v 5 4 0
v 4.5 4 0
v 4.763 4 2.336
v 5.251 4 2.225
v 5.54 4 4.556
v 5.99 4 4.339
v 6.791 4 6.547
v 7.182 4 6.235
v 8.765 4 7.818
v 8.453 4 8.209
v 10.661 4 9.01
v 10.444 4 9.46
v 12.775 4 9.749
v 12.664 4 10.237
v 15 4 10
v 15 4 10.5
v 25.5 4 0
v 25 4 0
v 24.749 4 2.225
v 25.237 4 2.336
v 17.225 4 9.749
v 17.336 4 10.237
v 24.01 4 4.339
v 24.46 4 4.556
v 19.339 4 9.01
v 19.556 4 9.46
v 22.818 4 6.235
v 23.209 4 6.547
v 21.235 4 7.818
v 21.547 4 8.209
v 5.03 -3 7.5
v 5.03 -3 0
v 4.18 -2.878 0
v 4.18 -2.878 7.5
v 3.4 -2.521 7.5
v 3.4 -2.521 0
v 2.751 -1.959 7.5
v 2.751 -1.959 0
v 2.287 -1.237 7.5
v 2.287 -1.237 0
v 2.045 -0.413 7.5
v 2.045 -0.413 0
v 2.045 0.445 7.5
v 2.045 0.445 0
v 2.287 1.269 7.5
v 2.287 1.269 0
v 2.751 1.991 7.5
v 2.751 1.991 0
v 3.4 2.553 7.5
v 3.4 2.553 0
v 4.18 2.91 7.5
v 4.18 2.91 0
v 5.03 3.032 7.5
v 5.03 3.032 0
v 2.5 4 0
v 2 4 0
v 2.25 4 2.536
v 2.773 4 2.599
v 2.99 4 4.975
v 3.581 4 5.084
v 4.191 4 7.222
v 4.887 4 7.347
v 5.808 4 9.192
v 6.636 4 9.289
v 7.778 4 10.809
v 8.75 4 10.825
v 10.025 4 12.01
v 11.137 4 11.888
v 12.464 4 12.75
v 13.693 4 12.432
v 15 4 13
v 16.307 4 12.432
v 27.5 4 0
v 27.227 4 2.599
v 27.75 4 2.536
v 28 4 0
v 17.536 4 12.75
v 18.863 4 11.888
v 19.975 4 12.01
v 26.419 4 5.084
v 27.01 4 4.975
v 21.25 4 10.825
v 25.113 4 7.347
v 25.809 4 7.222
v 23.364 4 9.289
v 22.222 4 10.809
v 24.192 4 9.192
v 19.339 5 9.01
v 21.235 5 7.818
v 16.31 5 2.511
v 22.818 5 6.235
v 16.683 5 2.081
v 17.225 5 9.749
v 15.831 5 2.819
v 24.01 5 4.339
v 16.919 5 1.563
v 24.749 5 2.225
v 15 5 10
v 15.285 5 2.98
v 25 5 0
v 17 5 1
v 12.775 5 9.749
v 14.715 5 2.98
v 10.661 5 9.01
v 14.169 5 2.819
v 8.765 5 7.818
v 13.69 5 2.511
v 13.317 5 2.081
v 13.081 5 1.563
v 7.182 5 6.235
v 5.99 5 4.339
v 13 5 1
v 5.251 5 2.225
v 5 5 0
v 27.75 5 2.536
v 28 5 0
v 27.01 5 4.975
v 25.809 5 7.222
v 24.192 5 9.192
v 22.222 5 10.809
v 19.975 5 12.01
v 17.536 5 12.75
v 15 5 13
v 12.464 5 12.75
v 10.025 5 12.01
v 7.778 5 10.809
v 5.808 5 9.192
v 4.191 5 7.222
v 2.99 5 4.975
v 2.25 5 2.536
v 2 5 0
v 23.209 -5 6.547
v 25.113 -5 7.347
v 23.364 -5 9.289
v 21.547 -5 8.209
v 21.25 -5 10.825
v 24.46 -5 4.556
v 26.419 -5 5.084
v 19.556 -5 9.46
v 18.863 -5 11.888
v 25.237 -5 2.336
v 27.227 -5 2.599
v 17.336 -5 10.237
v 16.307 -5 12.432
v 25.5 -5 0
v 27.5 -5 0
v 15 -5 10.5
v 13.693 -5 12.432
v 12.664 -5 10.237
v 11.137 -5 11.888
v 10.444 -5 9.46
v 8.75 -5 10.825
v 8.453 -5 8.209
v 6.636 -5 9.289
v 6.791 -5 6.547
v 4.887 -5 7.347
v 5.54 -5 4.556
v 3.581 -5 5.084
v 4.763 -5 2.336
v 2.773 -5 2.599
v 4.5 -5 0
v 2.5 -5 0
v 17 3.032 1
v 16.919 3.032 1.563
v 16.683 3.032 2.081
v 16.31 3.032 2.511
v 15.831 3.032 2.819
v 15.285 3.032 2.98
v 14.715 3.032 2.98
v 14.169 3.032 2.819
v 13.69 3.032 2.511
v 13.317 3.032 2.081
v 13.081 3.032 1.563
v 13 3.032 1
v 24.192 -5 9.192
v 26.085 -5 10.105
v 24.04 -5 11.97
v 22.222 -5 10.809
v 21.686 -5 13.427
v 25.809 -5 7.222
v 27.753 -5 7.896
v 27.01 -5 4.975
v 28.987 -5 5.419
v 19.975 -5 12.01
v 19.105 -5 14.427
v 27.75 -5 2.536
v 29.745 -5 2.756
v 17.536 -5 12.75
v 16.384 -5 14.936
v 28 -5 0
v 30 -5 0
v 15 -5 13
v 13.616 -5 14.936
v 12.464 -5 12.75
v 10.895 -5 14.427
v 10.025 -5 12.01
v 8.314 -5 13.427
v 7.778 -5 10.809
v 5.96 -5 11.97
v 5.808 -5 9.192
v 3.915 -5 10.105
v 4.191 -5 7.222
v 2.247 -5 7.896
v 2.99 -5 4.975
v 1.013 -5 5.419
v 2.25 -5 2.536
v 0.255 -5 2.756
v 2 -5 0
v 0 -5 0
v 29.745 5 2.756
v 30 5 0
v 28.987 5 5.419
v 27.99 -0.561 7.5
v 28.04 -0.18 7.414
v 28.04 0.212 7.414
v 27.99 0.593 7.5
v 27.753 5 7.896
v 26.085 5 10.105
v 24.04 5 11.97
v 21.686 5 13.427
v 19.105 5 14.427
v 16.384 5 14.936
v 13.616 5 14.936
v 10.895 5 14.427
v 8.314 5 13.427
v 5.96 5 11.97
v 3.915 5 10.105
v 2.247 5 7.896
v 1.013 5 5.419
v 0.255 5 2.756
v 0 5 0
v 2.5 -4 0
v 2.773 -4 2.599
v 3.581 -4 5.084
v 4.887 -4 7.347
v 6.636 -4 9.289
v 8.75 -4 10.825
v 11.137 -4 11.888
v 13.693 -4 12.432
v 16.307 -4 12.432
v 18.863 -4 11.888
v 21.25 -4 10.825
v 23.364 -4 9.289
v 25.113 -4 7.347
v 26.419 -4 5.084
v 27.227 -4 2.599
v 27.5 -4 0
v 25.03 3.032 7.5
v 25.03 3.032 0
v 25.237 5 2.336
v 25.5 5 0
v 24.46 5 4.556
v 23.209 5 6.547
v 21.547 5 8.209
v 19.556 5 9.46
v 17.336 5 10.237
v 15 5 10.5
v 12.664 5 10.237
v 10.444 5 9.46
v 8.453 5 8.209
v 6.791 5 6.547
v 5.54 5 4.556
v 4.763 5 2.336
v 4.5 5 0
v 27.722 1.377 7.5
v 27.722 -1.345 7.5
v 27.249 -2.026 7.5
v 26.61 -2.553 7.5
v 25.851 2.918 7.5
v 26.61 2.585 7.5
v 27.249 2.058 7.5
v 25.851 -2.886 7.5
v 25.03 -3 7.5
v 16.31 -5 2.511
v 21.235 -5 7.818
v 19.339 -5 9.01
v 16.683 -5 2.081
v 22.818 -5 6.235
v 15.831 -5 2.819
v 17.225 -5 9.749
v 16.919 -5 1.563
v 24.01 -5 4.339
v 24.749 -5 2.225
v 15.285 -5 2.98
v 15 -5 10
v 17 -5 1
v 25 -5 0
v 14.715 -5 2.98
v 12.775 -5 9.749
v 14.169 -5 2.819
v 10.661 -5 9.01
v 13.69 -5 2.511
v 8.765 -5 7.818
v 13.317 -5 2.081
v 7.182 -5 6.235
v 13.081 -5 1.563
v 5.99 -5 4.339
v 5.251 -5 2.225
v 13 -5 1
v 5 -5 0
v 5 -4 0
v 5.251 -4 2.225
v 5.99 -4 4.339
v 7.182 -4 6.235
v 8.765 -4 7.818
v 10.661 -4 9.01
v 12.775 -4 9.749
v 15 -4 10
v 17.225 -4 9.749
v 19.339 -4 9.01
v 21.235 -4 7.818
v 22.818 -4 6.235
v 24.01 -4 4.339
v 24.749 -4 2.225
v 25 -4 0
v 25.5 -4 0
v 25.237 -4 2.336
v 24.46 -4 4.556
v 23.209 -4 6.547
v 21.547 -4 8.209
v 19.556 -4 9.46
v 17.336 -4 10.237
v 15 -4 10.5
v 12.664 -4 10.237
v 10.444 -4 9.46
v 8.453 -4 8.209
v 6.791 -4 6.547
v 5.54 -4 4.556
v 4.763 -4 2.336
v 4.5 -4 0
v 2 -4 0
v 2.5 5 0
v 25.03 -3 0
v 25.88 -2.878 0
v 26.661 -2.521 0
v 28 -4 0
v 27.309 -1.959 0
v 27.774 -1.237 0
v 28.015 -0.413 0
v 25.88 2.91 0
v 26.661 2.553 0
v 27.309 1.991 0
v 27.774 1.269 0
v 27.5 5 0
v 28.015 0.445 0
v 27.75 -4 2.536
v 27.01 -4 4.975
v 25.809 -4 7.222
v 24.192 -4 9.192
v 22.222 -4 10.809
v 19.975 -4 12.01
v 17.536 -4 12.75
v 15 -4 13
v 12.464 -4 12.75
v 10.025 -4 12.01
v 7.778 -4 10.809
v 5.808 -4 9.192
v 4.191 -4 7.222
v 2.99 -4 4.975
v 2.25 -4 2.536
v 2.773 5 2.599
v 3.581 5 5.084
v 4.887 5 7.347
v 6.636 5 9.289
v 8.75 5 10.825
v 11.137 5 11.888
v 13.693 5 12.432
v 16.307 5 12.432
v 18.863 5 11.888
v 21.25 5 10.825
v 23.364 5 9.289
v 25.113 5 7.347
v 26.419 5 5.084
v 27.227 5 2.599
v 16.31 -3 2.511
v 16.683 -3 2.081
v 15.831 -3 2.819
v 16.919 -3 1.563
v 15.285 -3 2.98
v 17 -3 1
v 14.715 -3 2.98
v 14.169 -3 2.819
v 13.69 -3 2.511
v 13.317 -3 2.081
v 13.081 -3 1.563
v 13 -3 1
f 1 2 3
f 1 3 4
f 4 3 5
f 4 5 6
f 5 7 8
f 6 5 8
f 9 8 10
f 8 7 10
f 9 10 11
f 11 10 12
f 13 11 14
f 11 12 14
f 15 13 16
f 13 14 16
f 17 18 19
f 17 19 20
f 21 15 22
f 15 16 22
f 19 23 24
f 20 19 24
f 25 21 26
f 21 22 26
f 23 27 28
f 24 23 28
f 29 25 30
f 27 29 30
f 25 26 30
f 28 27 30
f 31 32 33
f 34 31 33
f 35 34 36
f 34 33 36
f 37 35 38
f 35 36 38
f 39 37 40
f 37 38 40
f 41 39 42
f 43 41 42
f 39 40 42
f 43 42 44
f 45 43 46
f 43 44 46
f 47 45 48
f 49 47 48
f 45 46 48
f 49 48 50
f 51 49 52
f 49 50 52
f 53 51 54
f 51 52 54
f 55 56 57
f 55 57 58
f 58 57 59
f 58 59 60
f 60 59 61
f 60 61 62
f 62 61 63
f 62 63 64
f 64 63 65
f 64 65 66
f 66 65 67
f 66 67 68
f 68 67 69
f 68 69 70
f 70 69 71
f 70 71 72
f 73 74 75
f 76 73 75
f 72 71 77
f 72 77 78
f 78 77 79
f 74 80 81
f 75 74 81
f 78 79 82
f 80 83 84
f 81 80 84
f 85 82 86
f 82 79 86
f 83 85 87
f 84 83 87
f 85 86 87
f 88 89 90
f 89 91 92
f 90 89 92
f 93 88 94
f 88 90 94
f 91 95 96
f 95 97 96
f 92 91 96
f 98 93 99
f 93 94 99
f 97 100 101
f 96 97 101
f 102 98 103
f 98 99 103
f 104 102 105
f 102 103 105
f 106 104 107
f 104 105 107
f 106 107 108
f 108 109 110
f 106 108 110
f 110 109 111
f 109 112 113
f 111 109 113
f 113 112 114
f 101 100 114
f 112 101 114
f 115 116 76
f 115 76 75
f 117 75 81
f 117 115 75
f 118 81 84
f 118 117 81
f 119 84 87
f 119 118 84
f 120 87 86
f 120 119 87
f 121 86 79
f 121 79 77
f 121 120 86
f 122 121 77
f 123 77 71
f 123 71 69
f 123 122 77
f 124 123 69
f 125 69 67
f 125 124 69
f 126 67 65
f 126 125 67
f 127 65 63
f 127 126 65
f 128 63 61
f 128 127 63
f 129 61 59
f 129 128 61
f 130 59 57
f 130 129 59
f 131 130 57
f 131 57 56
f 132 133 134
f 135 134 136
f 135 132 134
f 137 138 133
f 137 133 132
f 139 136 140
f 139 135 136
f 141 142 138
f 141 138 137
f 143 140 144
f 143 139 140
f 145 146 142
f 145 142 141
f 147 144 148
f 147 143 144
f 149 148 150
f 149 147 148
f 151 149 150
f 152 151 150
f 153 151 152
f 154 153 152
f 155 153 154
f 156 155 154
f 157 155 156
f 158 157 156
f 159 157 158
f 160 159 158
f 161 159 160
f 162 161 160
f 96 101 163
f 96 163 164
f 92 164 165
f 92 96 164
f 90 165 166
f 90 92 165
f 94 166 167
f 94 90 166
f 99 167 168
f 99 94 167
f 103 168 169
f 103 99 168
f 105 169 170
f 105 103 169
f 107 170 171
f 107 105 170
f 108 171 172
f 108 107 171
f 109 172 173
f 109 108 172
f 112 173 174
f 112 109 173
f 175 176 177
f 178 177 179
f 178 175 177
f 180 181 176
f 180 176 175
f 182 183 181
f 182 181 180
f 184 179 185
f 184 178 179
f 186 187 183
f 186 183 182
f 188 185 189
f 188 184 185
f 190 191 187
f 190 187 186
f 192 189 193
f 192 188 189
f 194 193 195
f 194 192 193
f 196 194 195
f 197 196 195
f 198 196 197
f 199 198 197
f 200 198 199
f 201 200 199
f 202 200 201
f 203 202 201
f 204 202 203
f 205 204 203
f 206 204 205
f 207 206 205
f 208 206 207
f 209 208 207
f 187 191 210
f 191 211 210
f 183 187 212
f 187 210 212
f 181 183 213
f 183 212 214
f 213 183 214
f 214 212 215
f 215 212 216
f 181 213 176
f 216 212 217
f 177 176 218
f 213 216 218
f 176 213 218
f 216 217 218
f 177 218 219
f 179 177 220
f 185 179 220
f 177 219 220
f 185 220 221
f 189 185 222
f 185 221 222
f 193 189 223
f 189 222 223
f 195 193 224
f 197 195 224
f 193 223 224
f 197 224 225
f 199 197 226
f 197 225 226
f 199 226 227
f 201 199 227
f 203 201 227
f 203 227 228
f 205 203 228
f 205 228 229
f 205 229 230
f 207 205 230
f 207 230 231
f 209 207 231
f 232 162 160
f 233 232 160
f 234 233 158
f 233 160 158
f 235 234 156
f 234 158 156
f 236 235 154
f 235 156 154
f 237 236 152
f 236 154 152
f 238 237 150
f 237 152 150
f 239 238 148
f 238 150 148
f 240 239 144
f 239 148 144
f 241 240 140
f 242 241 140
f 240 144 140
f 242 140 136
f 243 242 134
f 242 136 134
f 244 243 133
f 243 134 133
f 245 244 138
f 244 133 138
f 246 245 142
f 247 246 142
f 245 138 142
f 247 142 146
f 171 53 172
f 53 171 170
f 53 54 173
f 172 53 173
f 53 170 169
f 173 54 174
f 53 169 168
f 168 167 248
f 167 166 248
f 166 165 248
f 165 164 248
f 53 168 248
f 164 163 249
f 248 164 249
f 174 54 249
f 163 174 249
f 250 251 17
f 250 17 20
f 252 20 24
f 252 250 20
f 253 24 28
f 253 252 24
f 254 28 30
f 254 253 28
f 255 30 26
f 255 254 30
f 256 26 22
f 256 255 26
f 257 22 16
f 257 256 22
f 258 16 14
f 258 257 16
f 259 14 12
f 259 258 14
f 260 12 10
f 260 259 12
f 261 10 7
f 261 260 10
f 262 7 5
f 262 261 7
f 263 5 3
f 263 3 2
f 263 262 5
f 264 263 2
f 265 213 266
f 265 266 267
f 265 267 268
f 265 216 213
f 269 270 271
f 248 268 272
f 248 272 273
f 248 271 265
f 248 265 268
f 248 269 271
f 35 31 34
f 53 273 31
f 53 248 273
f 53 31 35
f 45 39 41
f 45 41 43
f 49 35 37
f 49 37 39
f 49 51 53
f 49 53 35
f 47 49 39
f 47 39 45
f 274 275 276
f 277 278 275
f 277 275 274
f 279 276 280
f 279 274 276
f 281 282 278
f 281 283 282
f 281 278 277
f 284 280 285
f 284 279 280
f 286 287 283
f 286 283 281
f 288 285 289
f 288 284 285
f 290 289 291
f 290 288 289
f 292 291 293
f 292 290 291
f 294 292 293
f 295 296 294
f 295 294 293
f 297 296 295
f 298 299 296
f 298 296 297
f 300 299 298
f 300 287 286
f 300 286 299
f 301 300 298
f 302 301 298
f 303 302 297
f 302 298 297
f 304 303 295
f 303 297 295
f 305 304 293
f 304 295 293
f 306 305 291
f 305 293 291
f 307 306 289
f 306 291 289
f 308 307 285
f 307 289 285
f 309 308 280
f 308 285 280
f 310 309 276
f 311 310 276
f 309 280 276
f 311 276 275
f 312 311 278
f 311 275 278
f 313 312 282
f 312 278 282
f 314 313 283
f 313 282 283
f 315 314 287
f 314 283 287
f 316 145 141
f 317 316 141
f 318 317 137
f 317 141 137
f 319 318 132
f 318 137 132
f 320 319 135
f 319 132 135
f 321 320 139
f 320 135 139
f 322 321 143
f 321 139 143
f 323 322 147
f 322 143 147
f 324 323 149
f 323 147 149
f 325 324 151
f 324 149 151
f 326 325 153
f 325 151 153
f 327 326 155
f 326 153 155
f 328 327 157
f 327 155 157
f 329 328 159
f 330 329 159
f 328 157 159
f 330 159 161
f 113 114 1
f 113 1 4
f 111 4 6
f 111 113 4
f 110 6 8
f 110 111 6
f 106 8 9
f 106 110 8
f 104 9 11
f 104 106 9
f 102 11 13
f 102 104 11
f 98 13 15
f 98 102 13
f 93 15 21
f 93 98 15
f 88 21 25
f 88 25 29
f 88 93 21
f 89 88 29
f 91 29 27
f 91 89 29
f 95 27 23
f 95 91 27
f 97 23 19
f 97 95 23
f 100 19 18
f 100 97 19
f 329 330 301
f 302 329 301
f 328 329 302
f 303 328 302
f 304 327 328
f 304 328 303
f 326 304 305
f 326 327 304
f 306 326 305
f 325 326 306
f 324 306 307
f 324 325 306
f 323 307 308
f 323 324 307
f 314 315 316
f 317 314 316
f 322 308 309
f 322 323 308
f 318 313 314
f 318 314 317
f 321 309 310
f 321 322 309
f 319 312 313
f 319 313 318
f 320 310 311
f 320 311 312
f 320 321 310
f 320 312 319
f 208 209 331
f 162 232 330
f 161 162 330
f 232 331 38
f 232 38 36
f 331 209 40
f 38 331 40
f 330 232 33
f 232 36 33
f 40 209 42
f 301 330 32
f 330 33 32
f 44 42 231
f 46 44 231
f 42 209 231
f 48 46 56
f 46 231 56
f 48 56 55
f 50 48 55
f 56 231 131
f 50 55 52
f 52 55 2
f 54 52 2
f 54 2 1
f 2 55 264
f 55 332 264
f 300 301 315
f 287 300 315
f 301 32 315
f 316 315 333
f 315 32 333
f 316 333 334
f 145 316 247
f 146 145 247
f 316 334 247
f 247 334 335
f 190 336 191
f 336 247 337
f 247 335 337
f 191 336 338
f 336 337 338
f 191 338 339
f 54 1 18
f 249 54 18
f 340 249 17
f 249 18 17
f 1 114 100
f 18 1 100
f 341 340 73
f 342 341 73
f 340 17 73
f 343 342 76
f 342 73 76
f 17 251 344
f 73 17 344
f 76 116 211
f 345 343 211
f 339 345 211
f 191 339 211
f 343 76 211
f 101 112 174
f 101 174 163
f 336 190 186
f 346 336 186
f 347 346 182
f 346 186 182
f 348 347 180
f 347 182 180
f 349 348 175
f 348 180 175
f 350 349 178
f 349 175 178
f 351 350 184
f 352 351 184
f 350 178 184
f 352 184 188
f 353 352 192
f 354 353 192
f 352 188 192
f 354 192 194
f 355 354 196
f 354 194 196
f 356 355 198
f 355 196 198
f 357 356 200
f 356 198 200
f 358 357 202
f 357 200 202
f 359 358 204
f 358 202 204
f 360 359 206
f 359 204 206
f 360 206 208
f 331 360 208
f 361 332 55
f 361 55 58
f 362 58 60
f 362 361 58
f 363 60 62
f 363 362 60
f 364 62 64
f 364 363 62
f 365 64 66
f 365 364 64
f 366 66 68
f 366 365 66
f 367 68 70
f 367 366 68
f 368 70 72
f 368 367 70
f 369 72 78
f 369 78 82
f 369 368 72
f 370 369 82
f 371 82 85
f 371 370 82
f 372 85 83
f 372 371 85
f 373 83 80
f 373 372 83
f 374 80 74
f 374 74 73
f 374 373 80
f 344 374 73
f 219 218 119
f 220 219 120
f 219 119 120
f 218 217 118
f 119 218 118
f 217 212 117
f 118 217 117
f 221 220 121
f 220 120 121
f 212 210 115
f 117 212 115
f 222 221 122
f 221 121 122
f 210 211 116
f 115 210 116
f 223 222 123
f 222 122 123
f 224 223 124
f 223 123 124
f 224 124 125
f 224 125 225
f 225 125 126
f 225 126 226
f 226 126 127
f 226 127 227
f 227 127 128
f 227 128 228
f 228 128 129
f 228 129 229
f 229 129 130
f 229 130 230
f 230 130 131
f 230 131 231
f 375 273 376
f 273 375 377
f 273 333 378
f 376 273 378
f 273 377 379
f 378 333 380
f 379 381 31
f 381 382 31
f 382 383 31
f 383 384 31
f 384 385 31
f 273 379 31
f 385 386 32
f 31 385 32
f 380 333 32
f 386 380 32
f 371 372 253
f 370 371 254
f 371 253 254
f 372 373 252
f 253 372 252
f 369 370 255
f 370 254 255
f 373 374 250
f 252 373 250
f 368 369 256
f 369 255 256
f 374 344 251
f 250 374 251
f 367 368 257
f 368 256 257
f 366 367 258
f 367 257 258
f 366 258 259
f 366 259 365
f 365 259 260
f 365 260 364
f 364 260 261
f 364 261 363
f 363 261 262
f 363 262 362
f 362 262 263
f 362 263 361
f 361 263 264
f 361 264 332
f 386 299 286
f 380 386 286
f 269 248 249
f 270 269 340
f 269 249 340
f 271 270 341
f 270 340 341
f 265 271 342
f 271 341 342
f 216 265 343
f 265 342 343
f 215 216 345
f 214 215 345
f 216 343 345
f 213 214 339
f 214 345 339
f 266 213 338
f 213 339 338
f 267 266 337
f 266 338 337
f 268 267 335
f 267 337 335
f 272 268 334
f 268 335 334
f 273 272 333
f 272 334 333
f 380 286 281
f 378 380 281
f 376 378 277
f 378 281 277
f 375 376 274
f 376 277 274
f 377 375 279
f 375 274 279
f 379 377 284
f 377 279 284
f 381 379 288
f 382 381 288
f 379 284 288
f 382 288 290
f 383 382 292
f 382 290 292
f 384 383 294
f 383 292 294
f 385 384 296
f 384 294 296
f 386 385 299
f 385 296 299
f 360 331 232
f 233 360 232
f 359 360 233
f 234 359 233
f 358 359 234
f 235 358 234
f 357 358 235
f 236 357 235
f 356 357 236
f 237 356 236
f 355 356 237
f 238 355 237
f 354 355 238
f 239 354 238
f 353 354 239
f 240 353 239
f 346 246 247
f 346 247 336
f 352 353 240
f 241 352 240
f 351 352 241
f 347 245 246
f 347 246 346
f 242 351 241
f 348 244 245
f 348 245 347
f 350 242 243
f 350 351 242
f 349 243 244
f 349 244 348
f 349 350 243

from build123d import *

# Parameters (mm, degrees)
EXTRUDE_1_DEPTH     = 5
CUT_EXTRUDE_2_DEPTH = 1
CUT_EXTRUDE_3_DEPTH = 1
CUT_EXTRUDE_4_DEPTH = 7.5
CUT_EXTRUDE_5_DEPTH = 2


with BuildPart() as part:
    # 草图1 → 凸台-拉伸1 (new, symmetric)
    with BuildSketch(Plane(origin=(0, 0, 0), x_dir=(1, 0, 0), z_dir=(0, 1, 0))):
        with BuildLine():
            Line((0, 0), (30, 0))
            ThreePointArc((30, 0), (15, -15), (0, 0))
        make_face()
    extrude(amount=EXTRUDE_1_DEPTH, both=True)

    # 草图2 → 切除-拉伸2 (cut)
    with BuildSketch(Plane.XZ.offset(5)):
        with BuildLine():
            Line((2, 0), (2.5, 0))
            ThreePointArc((2.5, 0), (15, 12.5), (27.5, 0))
            Line((27.5, 0), (28, 0))
            ThreePointArc((28, 0), (15, 13), (2, 0))
        make_face()
    cut_extrude_2 = extrude(amount=-CUT_EXTRUDE_2_DEPTH, mode=Mode.SUBTRACT)

    # 草图3 → 切除-拉伸3 (cut)
    with BuildSketch(Plane.XZ.offset(5)):
        with BuildLine():
            Line((4.5, 0), (5, 0))
            ThreePointArc((5, 0), (15, 10), (25, 0))
            Line((25, 0), (25.5, 0))
            ThreePointArc((25.5, 0), (15, 10.5), (4.5, 0))
        make_face()
    cut_extrude_3 = extrude(amount=-CUT_EXTRUDE_3_DEPTH, mode=Mode.SUBTRACT)

    # 镜向1: 切除-拉伸2, 切除-拉伸3 across plane
    add(cut_extrude_2.mirror(Plane(origin=(0, 0, 0), x_dir=(0, 0, 1), z_dir=(0, -1, 0))), mode=Mode.SUBTRACT)
    add(cut_extrude_3.mirror(Plane(origin=(0, 0, 0), x_dir=(0, 0, 1), z_dir=(0, -1, 0))), mode=Mode.SUBTRACT)

    # 草图5 → 切除-拉伸4 (cut)
    with BuildSketch(Plane(origin=(0, 0, 0), x_dir=(-1, 0, 0), z_dir=(0, 0, -1))):
        with BuildLine():
            Line((-25.030175513, -3), (-5.030175513, -3))
            ThreePointArc((-5.030175513, -3), (-2.01419916, 0.015976353), (-5.030175513, 3.031952706))
            Line((-5.030175513, 3.031952706), (-25.030175513, 3.031952706))
            ThreePointArc((-25.030175513, 3.031952706), (-28.046151866, 0.015976353), (-25.030175513, -3))
        make_face()
    extrude(amount=-CUT_EXTRUDE_4_DEPTH, mode=Mode.SUBTRACT)

    # 草图6 → 切除-拉伸5 (cut)
    with BuildSketch(Plane.XZ.offset(5)):
        with BuildLine():
            Line((13, 1), (17, 1))
            ThreePointArc((17, 1), (15, 3), (13, 1))
        make_face()
    cut_extrude_5 = extrude(amount=-CUT_EXTRUDE_5_DEPTH, mode=Mode.SUBTRACT)

    # 镜向2: 切除-拉伸5 across plane
    add(cut_extrude_5.mirror(Plane(origin=(0, 0, 0), x_dir=(0, 0, 1), z_dir=(0, -1, 0))), mode=Mode.SUBTRACT)


solid = part.part
